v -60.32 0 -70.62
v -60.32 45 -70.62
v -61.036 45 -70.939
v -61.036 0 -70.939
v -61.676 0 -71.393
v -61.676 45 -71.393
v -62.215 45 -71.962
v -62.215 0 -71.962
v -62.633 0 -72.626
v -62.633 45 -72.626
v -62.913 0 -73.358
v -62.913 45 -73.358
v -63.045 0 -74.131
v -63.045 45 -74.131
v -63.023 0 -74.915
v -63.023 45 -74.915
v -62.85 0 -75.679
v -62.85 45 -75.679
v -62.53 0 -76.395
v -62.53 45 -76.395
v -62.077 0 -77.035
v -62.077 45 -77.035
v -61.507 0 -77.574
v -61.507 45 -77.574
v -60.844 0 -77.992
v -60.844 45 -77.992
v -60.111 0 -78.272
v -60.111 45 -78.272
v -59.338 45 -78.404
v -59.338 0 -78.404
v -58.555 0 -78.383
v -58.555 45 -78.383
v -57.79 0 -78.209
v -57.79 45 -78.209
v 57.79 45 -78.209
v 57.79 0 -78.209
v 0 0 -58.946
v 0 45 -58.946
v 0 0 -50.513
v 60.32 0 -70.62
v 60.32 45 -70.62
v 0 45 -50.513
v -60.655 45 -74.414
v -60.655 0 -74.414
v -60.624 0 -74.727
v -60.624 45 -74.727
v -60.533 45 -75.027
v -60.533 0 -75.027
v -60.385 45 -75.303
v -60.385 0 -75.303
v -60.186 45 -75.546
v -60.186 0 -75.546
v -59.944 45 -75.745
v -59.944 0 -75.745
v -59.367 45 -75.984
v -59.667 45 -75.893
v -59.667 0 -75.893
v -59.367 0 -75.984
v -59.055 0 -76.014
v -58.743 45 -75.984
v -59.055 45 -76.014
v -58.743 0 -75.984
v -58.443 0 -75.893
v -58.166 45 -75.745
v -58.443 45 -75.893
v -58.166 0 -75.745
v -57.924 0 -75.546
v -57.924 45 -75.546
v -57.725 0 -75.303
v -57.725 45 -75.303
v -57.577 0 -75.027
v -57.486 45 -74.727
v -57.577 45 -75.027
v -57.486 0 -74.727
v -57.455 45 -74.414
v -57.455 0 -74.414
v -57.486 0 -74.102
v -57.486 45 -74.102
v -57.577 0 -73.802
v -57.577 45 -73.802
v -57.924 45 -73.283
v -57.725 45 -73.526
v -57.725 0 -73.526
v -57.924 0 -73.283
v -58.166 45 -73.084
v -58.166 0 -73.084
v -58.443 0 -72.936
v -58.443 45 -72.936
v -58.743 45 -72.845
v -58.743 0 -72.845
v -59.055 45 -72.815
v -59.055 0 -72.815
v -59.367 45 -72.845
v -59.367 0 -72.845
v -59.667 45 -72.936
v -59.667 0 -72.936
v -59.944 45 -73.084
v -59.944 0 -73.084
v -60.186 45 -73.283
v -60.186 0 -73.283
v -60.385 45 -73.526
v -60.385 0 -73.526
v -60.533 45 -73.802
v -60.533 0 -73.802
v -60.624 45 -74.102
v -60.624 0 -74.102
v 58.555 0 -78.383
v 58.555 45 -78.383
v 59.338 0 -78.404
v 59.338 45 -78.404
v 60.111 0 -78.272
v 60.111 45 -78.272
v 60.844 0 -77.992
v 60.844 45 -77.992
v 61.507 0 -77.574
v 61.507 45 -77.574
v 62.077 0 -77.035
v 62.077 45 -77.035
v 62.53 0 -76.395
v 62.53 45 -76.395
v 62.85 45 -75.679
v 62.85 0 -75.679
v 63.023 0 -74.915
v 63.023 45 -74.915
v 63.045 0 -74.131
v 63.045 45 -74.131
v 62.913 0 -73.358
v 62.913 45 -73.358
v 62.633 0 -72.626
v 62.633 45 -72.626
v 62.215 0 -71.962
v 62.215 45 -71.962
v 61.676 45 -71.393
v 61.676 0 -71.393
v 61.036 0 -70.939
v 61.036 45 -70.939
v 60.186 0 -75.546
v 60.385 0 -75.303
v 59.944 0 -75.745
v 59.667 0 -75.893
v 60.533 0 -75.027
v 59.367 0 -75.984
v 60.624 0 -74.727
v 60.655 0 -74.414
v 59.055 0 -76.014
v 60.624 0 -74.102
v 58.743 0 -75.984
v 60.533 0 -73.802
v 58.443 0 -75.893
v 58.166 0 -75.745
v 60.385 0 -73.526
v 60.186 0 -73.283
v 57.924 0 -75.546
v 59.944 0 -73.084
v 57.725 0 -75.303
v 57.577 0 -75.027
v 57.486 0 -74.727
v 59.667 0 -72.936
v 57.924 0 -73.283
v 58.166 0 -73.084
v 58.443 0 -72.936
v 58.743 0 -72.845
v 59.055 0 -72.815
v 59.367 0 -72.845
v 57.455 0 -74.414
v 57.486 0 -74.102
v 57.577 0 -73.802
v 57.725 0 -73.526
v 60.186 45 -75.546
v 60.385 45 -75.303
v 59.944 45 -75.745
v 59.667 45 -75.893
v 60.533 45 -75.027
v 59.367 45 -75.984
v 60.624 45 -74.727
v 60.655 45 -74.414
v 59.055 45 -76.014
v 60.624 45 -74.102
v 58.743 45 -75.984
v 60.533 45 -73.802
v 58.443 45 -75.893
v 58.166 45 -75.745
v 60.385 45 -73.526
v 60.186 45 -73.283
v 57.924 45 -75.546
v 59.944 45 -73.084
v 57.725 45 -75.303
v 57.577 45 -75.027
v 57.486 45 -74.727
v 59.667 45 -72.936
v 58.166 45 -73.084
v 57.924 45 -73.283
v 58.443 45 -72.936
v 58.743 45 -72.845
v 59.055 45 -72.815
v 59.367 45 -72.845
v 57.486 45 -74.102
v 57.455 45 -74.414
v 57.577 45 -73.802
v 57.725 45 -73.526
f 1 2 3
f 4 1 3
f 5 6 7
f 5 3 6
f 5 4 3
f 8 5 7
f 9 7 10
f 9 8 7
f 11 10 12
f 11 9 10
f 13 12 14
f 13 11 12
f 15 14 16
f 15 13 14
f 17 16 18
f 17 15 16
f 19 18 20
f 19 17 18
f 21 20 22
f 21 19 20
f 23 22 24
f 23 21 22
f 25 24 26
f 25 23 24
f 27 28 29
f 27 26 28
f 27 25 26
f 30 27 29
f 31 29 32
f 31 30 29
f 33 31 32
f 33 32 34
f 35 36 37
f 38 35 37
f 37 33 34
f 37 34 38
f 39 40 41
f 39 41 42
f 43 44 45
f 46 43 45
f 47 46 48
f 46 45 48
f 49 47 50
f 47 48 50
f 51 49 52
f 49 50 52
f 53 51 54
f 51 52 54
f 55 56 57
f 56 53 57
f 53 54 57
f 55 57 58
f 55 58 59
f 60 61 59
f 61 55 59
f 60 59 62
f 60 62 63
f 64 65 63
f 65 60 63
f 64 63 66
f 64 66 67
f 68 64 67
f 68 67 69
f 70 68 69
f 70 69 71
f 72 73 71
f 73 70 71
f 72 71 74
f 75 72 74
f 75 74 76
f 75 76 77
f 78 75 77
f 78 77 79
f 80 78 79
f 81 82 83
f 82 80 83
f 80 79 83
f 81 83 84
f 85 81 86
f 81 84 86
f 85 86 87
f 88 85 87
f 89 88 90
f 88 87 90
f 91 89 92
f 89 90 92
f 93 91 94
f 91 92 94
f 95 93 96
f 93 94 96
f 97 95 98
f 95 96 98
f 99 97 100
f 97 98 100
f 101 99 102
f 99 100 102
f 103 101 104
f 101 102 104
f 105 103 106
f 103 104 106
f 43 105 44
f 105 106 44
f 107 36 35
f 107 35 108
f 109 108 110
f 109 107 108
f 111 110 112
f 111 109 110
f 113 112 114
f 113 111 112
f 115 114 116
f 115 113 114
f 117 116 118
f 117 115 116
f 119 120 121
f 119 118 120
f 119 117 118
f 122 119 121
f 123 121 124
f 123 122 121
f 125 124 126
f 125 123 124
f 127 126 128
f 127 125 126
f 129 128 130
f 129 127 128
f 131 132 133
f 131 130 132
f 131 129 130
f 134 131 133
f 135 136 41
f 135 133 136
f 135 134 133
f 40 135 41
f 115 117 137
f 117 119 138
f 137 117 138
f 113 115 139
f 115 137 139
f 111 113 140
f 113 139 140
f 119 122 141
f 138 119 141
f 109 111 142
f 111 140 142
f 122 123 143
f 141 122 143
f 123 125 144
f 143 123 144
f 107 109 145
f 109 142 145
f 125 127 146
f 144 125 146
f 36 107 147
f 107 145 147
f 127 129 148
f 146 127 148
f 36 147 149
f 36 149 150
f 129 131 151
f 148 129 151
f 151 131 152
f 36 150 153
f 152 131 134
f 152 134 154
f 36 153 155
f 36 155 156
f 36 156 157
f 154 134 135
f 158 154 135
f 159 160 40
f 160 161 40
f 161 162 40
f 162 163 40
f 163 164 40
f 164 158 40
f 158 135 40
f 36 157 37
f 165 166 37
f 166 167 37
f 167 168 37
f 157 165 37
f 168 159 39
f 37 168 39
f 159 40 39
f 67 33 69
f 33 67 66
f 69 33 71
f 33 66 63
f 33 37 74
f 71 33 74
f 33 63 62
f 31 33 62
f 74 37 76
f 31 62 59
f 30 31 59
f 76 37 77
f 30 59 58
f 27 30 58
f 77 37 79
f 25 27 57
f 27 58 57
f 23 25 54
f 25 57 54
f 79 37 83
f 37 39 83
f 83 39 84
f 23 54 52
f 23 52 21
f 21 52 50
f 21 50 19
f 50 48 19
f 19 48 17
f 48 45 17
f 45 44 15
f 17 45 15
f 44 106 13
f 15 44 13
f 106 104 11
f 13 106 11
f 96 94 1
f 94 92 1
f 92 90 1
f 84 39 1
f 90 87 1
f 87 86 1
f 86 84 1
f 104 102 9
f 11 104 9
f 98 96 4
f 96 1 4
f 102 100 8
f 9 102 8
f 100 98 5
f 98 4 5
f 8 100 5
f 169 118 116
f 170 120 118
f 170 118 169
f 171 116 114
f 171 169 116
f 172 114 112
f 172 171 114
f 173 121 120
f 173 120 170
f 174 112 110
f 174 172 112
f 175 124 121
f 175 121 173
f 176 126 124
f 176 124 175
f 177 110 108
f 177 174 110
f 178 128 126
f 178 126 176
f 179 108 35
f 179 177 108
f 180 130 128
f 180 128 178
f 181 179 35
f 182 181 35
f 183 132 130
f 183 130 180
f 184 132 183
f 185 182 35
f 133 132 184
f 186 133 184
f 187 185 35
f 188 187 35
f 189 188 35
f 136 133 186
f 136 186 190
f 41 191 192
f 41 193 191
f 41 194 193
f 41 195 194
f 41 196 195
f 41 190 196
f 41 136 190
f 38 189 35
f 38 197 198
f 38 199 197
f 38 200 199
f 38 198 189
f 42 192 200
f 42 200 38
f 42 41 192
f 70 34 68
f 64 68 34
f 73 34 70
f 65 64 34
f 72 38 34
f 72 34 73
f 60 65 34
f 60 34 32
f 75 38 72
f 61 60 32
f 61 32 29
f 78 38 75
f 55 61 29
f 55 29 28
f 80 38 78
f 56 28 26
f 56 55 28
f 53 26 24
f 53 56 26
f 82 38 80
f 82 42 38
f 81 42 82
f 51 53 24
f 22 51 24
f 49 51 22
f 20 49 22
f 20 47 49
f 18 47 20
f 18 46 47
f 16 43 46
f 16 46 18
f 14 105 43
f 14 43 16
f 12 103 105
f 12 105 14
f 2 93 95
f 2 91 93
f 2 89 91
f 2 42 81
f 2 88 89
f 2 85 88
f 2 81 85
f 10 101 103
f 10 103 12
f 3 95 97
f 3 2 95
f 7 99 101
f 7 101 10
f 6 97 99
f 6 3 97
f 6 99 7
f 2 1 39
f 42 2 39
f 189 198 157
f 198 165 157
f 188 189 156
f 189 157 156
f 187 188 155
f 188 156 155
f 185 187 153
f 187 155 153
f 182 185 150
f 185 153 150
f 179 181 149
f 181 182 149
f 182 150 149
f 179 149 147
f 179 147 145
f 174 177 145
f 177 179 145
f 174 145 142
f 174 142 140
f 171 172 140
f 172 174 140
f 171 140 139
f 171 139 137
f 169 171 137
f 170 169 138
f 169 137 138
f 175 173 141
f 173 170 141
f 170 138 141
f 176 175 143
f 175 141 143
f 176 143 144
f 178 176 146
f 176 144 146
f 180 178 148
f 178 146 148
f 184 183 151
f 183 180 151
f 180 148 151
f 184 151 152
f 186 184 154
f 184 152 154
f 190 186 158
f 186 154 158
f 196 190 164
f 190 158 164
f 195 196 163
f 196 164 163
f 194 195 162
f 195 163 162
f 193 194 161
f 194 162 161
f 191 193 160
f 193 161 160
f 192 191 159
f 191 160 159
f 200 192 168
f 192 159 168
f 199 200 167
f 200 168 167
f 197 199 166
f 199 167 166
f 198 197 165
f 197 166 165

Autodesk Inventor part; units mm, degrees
ref_plane "YZ Plane" through (0, 0, 0) normal (1, 0, 0) x (0, 1, 0)
ref_plane "XZ Plane" through (0, 0, 0) normal (0, 1, 0) x (-1, 0, 0)
ref_plane "XY Plane" through (0, 0, 0) normal (0, 0, 1) x (1, 0, 0)
sketch "Sketch1" plane through (0, 0, 0) normal (0, 1, 0) x (-1, 0, 0)
  circle A0 centre (59.0549, -74.4145) radius 1.6
  circle A1 centre (-59.0549, -74.4145) radius 1.6
  line L0 (57.79, -78.2092) -> (0, -58.9459)
  line L1 (-57.79, -78.2092) -> (0, -58.9459)
  line L2 (-60.3198, -70.6198) -> (0, -50.5132)
  line L3 (60.3198, -70.6198) -> (0, -50.5132)
  arc A2 (57.79, -78.2092) -> (60.3198, -70.6198) centre (59.0549, -74.4145) ccw
  arc A3 (-60.3198, -70.6198) -> (-57.79, -78.2092) centre (-59.0549, -74.4145) ccw
extrude "Extrusion1" add sketch "Sketch1" along normal blind 45
properties part number "Front Support"
